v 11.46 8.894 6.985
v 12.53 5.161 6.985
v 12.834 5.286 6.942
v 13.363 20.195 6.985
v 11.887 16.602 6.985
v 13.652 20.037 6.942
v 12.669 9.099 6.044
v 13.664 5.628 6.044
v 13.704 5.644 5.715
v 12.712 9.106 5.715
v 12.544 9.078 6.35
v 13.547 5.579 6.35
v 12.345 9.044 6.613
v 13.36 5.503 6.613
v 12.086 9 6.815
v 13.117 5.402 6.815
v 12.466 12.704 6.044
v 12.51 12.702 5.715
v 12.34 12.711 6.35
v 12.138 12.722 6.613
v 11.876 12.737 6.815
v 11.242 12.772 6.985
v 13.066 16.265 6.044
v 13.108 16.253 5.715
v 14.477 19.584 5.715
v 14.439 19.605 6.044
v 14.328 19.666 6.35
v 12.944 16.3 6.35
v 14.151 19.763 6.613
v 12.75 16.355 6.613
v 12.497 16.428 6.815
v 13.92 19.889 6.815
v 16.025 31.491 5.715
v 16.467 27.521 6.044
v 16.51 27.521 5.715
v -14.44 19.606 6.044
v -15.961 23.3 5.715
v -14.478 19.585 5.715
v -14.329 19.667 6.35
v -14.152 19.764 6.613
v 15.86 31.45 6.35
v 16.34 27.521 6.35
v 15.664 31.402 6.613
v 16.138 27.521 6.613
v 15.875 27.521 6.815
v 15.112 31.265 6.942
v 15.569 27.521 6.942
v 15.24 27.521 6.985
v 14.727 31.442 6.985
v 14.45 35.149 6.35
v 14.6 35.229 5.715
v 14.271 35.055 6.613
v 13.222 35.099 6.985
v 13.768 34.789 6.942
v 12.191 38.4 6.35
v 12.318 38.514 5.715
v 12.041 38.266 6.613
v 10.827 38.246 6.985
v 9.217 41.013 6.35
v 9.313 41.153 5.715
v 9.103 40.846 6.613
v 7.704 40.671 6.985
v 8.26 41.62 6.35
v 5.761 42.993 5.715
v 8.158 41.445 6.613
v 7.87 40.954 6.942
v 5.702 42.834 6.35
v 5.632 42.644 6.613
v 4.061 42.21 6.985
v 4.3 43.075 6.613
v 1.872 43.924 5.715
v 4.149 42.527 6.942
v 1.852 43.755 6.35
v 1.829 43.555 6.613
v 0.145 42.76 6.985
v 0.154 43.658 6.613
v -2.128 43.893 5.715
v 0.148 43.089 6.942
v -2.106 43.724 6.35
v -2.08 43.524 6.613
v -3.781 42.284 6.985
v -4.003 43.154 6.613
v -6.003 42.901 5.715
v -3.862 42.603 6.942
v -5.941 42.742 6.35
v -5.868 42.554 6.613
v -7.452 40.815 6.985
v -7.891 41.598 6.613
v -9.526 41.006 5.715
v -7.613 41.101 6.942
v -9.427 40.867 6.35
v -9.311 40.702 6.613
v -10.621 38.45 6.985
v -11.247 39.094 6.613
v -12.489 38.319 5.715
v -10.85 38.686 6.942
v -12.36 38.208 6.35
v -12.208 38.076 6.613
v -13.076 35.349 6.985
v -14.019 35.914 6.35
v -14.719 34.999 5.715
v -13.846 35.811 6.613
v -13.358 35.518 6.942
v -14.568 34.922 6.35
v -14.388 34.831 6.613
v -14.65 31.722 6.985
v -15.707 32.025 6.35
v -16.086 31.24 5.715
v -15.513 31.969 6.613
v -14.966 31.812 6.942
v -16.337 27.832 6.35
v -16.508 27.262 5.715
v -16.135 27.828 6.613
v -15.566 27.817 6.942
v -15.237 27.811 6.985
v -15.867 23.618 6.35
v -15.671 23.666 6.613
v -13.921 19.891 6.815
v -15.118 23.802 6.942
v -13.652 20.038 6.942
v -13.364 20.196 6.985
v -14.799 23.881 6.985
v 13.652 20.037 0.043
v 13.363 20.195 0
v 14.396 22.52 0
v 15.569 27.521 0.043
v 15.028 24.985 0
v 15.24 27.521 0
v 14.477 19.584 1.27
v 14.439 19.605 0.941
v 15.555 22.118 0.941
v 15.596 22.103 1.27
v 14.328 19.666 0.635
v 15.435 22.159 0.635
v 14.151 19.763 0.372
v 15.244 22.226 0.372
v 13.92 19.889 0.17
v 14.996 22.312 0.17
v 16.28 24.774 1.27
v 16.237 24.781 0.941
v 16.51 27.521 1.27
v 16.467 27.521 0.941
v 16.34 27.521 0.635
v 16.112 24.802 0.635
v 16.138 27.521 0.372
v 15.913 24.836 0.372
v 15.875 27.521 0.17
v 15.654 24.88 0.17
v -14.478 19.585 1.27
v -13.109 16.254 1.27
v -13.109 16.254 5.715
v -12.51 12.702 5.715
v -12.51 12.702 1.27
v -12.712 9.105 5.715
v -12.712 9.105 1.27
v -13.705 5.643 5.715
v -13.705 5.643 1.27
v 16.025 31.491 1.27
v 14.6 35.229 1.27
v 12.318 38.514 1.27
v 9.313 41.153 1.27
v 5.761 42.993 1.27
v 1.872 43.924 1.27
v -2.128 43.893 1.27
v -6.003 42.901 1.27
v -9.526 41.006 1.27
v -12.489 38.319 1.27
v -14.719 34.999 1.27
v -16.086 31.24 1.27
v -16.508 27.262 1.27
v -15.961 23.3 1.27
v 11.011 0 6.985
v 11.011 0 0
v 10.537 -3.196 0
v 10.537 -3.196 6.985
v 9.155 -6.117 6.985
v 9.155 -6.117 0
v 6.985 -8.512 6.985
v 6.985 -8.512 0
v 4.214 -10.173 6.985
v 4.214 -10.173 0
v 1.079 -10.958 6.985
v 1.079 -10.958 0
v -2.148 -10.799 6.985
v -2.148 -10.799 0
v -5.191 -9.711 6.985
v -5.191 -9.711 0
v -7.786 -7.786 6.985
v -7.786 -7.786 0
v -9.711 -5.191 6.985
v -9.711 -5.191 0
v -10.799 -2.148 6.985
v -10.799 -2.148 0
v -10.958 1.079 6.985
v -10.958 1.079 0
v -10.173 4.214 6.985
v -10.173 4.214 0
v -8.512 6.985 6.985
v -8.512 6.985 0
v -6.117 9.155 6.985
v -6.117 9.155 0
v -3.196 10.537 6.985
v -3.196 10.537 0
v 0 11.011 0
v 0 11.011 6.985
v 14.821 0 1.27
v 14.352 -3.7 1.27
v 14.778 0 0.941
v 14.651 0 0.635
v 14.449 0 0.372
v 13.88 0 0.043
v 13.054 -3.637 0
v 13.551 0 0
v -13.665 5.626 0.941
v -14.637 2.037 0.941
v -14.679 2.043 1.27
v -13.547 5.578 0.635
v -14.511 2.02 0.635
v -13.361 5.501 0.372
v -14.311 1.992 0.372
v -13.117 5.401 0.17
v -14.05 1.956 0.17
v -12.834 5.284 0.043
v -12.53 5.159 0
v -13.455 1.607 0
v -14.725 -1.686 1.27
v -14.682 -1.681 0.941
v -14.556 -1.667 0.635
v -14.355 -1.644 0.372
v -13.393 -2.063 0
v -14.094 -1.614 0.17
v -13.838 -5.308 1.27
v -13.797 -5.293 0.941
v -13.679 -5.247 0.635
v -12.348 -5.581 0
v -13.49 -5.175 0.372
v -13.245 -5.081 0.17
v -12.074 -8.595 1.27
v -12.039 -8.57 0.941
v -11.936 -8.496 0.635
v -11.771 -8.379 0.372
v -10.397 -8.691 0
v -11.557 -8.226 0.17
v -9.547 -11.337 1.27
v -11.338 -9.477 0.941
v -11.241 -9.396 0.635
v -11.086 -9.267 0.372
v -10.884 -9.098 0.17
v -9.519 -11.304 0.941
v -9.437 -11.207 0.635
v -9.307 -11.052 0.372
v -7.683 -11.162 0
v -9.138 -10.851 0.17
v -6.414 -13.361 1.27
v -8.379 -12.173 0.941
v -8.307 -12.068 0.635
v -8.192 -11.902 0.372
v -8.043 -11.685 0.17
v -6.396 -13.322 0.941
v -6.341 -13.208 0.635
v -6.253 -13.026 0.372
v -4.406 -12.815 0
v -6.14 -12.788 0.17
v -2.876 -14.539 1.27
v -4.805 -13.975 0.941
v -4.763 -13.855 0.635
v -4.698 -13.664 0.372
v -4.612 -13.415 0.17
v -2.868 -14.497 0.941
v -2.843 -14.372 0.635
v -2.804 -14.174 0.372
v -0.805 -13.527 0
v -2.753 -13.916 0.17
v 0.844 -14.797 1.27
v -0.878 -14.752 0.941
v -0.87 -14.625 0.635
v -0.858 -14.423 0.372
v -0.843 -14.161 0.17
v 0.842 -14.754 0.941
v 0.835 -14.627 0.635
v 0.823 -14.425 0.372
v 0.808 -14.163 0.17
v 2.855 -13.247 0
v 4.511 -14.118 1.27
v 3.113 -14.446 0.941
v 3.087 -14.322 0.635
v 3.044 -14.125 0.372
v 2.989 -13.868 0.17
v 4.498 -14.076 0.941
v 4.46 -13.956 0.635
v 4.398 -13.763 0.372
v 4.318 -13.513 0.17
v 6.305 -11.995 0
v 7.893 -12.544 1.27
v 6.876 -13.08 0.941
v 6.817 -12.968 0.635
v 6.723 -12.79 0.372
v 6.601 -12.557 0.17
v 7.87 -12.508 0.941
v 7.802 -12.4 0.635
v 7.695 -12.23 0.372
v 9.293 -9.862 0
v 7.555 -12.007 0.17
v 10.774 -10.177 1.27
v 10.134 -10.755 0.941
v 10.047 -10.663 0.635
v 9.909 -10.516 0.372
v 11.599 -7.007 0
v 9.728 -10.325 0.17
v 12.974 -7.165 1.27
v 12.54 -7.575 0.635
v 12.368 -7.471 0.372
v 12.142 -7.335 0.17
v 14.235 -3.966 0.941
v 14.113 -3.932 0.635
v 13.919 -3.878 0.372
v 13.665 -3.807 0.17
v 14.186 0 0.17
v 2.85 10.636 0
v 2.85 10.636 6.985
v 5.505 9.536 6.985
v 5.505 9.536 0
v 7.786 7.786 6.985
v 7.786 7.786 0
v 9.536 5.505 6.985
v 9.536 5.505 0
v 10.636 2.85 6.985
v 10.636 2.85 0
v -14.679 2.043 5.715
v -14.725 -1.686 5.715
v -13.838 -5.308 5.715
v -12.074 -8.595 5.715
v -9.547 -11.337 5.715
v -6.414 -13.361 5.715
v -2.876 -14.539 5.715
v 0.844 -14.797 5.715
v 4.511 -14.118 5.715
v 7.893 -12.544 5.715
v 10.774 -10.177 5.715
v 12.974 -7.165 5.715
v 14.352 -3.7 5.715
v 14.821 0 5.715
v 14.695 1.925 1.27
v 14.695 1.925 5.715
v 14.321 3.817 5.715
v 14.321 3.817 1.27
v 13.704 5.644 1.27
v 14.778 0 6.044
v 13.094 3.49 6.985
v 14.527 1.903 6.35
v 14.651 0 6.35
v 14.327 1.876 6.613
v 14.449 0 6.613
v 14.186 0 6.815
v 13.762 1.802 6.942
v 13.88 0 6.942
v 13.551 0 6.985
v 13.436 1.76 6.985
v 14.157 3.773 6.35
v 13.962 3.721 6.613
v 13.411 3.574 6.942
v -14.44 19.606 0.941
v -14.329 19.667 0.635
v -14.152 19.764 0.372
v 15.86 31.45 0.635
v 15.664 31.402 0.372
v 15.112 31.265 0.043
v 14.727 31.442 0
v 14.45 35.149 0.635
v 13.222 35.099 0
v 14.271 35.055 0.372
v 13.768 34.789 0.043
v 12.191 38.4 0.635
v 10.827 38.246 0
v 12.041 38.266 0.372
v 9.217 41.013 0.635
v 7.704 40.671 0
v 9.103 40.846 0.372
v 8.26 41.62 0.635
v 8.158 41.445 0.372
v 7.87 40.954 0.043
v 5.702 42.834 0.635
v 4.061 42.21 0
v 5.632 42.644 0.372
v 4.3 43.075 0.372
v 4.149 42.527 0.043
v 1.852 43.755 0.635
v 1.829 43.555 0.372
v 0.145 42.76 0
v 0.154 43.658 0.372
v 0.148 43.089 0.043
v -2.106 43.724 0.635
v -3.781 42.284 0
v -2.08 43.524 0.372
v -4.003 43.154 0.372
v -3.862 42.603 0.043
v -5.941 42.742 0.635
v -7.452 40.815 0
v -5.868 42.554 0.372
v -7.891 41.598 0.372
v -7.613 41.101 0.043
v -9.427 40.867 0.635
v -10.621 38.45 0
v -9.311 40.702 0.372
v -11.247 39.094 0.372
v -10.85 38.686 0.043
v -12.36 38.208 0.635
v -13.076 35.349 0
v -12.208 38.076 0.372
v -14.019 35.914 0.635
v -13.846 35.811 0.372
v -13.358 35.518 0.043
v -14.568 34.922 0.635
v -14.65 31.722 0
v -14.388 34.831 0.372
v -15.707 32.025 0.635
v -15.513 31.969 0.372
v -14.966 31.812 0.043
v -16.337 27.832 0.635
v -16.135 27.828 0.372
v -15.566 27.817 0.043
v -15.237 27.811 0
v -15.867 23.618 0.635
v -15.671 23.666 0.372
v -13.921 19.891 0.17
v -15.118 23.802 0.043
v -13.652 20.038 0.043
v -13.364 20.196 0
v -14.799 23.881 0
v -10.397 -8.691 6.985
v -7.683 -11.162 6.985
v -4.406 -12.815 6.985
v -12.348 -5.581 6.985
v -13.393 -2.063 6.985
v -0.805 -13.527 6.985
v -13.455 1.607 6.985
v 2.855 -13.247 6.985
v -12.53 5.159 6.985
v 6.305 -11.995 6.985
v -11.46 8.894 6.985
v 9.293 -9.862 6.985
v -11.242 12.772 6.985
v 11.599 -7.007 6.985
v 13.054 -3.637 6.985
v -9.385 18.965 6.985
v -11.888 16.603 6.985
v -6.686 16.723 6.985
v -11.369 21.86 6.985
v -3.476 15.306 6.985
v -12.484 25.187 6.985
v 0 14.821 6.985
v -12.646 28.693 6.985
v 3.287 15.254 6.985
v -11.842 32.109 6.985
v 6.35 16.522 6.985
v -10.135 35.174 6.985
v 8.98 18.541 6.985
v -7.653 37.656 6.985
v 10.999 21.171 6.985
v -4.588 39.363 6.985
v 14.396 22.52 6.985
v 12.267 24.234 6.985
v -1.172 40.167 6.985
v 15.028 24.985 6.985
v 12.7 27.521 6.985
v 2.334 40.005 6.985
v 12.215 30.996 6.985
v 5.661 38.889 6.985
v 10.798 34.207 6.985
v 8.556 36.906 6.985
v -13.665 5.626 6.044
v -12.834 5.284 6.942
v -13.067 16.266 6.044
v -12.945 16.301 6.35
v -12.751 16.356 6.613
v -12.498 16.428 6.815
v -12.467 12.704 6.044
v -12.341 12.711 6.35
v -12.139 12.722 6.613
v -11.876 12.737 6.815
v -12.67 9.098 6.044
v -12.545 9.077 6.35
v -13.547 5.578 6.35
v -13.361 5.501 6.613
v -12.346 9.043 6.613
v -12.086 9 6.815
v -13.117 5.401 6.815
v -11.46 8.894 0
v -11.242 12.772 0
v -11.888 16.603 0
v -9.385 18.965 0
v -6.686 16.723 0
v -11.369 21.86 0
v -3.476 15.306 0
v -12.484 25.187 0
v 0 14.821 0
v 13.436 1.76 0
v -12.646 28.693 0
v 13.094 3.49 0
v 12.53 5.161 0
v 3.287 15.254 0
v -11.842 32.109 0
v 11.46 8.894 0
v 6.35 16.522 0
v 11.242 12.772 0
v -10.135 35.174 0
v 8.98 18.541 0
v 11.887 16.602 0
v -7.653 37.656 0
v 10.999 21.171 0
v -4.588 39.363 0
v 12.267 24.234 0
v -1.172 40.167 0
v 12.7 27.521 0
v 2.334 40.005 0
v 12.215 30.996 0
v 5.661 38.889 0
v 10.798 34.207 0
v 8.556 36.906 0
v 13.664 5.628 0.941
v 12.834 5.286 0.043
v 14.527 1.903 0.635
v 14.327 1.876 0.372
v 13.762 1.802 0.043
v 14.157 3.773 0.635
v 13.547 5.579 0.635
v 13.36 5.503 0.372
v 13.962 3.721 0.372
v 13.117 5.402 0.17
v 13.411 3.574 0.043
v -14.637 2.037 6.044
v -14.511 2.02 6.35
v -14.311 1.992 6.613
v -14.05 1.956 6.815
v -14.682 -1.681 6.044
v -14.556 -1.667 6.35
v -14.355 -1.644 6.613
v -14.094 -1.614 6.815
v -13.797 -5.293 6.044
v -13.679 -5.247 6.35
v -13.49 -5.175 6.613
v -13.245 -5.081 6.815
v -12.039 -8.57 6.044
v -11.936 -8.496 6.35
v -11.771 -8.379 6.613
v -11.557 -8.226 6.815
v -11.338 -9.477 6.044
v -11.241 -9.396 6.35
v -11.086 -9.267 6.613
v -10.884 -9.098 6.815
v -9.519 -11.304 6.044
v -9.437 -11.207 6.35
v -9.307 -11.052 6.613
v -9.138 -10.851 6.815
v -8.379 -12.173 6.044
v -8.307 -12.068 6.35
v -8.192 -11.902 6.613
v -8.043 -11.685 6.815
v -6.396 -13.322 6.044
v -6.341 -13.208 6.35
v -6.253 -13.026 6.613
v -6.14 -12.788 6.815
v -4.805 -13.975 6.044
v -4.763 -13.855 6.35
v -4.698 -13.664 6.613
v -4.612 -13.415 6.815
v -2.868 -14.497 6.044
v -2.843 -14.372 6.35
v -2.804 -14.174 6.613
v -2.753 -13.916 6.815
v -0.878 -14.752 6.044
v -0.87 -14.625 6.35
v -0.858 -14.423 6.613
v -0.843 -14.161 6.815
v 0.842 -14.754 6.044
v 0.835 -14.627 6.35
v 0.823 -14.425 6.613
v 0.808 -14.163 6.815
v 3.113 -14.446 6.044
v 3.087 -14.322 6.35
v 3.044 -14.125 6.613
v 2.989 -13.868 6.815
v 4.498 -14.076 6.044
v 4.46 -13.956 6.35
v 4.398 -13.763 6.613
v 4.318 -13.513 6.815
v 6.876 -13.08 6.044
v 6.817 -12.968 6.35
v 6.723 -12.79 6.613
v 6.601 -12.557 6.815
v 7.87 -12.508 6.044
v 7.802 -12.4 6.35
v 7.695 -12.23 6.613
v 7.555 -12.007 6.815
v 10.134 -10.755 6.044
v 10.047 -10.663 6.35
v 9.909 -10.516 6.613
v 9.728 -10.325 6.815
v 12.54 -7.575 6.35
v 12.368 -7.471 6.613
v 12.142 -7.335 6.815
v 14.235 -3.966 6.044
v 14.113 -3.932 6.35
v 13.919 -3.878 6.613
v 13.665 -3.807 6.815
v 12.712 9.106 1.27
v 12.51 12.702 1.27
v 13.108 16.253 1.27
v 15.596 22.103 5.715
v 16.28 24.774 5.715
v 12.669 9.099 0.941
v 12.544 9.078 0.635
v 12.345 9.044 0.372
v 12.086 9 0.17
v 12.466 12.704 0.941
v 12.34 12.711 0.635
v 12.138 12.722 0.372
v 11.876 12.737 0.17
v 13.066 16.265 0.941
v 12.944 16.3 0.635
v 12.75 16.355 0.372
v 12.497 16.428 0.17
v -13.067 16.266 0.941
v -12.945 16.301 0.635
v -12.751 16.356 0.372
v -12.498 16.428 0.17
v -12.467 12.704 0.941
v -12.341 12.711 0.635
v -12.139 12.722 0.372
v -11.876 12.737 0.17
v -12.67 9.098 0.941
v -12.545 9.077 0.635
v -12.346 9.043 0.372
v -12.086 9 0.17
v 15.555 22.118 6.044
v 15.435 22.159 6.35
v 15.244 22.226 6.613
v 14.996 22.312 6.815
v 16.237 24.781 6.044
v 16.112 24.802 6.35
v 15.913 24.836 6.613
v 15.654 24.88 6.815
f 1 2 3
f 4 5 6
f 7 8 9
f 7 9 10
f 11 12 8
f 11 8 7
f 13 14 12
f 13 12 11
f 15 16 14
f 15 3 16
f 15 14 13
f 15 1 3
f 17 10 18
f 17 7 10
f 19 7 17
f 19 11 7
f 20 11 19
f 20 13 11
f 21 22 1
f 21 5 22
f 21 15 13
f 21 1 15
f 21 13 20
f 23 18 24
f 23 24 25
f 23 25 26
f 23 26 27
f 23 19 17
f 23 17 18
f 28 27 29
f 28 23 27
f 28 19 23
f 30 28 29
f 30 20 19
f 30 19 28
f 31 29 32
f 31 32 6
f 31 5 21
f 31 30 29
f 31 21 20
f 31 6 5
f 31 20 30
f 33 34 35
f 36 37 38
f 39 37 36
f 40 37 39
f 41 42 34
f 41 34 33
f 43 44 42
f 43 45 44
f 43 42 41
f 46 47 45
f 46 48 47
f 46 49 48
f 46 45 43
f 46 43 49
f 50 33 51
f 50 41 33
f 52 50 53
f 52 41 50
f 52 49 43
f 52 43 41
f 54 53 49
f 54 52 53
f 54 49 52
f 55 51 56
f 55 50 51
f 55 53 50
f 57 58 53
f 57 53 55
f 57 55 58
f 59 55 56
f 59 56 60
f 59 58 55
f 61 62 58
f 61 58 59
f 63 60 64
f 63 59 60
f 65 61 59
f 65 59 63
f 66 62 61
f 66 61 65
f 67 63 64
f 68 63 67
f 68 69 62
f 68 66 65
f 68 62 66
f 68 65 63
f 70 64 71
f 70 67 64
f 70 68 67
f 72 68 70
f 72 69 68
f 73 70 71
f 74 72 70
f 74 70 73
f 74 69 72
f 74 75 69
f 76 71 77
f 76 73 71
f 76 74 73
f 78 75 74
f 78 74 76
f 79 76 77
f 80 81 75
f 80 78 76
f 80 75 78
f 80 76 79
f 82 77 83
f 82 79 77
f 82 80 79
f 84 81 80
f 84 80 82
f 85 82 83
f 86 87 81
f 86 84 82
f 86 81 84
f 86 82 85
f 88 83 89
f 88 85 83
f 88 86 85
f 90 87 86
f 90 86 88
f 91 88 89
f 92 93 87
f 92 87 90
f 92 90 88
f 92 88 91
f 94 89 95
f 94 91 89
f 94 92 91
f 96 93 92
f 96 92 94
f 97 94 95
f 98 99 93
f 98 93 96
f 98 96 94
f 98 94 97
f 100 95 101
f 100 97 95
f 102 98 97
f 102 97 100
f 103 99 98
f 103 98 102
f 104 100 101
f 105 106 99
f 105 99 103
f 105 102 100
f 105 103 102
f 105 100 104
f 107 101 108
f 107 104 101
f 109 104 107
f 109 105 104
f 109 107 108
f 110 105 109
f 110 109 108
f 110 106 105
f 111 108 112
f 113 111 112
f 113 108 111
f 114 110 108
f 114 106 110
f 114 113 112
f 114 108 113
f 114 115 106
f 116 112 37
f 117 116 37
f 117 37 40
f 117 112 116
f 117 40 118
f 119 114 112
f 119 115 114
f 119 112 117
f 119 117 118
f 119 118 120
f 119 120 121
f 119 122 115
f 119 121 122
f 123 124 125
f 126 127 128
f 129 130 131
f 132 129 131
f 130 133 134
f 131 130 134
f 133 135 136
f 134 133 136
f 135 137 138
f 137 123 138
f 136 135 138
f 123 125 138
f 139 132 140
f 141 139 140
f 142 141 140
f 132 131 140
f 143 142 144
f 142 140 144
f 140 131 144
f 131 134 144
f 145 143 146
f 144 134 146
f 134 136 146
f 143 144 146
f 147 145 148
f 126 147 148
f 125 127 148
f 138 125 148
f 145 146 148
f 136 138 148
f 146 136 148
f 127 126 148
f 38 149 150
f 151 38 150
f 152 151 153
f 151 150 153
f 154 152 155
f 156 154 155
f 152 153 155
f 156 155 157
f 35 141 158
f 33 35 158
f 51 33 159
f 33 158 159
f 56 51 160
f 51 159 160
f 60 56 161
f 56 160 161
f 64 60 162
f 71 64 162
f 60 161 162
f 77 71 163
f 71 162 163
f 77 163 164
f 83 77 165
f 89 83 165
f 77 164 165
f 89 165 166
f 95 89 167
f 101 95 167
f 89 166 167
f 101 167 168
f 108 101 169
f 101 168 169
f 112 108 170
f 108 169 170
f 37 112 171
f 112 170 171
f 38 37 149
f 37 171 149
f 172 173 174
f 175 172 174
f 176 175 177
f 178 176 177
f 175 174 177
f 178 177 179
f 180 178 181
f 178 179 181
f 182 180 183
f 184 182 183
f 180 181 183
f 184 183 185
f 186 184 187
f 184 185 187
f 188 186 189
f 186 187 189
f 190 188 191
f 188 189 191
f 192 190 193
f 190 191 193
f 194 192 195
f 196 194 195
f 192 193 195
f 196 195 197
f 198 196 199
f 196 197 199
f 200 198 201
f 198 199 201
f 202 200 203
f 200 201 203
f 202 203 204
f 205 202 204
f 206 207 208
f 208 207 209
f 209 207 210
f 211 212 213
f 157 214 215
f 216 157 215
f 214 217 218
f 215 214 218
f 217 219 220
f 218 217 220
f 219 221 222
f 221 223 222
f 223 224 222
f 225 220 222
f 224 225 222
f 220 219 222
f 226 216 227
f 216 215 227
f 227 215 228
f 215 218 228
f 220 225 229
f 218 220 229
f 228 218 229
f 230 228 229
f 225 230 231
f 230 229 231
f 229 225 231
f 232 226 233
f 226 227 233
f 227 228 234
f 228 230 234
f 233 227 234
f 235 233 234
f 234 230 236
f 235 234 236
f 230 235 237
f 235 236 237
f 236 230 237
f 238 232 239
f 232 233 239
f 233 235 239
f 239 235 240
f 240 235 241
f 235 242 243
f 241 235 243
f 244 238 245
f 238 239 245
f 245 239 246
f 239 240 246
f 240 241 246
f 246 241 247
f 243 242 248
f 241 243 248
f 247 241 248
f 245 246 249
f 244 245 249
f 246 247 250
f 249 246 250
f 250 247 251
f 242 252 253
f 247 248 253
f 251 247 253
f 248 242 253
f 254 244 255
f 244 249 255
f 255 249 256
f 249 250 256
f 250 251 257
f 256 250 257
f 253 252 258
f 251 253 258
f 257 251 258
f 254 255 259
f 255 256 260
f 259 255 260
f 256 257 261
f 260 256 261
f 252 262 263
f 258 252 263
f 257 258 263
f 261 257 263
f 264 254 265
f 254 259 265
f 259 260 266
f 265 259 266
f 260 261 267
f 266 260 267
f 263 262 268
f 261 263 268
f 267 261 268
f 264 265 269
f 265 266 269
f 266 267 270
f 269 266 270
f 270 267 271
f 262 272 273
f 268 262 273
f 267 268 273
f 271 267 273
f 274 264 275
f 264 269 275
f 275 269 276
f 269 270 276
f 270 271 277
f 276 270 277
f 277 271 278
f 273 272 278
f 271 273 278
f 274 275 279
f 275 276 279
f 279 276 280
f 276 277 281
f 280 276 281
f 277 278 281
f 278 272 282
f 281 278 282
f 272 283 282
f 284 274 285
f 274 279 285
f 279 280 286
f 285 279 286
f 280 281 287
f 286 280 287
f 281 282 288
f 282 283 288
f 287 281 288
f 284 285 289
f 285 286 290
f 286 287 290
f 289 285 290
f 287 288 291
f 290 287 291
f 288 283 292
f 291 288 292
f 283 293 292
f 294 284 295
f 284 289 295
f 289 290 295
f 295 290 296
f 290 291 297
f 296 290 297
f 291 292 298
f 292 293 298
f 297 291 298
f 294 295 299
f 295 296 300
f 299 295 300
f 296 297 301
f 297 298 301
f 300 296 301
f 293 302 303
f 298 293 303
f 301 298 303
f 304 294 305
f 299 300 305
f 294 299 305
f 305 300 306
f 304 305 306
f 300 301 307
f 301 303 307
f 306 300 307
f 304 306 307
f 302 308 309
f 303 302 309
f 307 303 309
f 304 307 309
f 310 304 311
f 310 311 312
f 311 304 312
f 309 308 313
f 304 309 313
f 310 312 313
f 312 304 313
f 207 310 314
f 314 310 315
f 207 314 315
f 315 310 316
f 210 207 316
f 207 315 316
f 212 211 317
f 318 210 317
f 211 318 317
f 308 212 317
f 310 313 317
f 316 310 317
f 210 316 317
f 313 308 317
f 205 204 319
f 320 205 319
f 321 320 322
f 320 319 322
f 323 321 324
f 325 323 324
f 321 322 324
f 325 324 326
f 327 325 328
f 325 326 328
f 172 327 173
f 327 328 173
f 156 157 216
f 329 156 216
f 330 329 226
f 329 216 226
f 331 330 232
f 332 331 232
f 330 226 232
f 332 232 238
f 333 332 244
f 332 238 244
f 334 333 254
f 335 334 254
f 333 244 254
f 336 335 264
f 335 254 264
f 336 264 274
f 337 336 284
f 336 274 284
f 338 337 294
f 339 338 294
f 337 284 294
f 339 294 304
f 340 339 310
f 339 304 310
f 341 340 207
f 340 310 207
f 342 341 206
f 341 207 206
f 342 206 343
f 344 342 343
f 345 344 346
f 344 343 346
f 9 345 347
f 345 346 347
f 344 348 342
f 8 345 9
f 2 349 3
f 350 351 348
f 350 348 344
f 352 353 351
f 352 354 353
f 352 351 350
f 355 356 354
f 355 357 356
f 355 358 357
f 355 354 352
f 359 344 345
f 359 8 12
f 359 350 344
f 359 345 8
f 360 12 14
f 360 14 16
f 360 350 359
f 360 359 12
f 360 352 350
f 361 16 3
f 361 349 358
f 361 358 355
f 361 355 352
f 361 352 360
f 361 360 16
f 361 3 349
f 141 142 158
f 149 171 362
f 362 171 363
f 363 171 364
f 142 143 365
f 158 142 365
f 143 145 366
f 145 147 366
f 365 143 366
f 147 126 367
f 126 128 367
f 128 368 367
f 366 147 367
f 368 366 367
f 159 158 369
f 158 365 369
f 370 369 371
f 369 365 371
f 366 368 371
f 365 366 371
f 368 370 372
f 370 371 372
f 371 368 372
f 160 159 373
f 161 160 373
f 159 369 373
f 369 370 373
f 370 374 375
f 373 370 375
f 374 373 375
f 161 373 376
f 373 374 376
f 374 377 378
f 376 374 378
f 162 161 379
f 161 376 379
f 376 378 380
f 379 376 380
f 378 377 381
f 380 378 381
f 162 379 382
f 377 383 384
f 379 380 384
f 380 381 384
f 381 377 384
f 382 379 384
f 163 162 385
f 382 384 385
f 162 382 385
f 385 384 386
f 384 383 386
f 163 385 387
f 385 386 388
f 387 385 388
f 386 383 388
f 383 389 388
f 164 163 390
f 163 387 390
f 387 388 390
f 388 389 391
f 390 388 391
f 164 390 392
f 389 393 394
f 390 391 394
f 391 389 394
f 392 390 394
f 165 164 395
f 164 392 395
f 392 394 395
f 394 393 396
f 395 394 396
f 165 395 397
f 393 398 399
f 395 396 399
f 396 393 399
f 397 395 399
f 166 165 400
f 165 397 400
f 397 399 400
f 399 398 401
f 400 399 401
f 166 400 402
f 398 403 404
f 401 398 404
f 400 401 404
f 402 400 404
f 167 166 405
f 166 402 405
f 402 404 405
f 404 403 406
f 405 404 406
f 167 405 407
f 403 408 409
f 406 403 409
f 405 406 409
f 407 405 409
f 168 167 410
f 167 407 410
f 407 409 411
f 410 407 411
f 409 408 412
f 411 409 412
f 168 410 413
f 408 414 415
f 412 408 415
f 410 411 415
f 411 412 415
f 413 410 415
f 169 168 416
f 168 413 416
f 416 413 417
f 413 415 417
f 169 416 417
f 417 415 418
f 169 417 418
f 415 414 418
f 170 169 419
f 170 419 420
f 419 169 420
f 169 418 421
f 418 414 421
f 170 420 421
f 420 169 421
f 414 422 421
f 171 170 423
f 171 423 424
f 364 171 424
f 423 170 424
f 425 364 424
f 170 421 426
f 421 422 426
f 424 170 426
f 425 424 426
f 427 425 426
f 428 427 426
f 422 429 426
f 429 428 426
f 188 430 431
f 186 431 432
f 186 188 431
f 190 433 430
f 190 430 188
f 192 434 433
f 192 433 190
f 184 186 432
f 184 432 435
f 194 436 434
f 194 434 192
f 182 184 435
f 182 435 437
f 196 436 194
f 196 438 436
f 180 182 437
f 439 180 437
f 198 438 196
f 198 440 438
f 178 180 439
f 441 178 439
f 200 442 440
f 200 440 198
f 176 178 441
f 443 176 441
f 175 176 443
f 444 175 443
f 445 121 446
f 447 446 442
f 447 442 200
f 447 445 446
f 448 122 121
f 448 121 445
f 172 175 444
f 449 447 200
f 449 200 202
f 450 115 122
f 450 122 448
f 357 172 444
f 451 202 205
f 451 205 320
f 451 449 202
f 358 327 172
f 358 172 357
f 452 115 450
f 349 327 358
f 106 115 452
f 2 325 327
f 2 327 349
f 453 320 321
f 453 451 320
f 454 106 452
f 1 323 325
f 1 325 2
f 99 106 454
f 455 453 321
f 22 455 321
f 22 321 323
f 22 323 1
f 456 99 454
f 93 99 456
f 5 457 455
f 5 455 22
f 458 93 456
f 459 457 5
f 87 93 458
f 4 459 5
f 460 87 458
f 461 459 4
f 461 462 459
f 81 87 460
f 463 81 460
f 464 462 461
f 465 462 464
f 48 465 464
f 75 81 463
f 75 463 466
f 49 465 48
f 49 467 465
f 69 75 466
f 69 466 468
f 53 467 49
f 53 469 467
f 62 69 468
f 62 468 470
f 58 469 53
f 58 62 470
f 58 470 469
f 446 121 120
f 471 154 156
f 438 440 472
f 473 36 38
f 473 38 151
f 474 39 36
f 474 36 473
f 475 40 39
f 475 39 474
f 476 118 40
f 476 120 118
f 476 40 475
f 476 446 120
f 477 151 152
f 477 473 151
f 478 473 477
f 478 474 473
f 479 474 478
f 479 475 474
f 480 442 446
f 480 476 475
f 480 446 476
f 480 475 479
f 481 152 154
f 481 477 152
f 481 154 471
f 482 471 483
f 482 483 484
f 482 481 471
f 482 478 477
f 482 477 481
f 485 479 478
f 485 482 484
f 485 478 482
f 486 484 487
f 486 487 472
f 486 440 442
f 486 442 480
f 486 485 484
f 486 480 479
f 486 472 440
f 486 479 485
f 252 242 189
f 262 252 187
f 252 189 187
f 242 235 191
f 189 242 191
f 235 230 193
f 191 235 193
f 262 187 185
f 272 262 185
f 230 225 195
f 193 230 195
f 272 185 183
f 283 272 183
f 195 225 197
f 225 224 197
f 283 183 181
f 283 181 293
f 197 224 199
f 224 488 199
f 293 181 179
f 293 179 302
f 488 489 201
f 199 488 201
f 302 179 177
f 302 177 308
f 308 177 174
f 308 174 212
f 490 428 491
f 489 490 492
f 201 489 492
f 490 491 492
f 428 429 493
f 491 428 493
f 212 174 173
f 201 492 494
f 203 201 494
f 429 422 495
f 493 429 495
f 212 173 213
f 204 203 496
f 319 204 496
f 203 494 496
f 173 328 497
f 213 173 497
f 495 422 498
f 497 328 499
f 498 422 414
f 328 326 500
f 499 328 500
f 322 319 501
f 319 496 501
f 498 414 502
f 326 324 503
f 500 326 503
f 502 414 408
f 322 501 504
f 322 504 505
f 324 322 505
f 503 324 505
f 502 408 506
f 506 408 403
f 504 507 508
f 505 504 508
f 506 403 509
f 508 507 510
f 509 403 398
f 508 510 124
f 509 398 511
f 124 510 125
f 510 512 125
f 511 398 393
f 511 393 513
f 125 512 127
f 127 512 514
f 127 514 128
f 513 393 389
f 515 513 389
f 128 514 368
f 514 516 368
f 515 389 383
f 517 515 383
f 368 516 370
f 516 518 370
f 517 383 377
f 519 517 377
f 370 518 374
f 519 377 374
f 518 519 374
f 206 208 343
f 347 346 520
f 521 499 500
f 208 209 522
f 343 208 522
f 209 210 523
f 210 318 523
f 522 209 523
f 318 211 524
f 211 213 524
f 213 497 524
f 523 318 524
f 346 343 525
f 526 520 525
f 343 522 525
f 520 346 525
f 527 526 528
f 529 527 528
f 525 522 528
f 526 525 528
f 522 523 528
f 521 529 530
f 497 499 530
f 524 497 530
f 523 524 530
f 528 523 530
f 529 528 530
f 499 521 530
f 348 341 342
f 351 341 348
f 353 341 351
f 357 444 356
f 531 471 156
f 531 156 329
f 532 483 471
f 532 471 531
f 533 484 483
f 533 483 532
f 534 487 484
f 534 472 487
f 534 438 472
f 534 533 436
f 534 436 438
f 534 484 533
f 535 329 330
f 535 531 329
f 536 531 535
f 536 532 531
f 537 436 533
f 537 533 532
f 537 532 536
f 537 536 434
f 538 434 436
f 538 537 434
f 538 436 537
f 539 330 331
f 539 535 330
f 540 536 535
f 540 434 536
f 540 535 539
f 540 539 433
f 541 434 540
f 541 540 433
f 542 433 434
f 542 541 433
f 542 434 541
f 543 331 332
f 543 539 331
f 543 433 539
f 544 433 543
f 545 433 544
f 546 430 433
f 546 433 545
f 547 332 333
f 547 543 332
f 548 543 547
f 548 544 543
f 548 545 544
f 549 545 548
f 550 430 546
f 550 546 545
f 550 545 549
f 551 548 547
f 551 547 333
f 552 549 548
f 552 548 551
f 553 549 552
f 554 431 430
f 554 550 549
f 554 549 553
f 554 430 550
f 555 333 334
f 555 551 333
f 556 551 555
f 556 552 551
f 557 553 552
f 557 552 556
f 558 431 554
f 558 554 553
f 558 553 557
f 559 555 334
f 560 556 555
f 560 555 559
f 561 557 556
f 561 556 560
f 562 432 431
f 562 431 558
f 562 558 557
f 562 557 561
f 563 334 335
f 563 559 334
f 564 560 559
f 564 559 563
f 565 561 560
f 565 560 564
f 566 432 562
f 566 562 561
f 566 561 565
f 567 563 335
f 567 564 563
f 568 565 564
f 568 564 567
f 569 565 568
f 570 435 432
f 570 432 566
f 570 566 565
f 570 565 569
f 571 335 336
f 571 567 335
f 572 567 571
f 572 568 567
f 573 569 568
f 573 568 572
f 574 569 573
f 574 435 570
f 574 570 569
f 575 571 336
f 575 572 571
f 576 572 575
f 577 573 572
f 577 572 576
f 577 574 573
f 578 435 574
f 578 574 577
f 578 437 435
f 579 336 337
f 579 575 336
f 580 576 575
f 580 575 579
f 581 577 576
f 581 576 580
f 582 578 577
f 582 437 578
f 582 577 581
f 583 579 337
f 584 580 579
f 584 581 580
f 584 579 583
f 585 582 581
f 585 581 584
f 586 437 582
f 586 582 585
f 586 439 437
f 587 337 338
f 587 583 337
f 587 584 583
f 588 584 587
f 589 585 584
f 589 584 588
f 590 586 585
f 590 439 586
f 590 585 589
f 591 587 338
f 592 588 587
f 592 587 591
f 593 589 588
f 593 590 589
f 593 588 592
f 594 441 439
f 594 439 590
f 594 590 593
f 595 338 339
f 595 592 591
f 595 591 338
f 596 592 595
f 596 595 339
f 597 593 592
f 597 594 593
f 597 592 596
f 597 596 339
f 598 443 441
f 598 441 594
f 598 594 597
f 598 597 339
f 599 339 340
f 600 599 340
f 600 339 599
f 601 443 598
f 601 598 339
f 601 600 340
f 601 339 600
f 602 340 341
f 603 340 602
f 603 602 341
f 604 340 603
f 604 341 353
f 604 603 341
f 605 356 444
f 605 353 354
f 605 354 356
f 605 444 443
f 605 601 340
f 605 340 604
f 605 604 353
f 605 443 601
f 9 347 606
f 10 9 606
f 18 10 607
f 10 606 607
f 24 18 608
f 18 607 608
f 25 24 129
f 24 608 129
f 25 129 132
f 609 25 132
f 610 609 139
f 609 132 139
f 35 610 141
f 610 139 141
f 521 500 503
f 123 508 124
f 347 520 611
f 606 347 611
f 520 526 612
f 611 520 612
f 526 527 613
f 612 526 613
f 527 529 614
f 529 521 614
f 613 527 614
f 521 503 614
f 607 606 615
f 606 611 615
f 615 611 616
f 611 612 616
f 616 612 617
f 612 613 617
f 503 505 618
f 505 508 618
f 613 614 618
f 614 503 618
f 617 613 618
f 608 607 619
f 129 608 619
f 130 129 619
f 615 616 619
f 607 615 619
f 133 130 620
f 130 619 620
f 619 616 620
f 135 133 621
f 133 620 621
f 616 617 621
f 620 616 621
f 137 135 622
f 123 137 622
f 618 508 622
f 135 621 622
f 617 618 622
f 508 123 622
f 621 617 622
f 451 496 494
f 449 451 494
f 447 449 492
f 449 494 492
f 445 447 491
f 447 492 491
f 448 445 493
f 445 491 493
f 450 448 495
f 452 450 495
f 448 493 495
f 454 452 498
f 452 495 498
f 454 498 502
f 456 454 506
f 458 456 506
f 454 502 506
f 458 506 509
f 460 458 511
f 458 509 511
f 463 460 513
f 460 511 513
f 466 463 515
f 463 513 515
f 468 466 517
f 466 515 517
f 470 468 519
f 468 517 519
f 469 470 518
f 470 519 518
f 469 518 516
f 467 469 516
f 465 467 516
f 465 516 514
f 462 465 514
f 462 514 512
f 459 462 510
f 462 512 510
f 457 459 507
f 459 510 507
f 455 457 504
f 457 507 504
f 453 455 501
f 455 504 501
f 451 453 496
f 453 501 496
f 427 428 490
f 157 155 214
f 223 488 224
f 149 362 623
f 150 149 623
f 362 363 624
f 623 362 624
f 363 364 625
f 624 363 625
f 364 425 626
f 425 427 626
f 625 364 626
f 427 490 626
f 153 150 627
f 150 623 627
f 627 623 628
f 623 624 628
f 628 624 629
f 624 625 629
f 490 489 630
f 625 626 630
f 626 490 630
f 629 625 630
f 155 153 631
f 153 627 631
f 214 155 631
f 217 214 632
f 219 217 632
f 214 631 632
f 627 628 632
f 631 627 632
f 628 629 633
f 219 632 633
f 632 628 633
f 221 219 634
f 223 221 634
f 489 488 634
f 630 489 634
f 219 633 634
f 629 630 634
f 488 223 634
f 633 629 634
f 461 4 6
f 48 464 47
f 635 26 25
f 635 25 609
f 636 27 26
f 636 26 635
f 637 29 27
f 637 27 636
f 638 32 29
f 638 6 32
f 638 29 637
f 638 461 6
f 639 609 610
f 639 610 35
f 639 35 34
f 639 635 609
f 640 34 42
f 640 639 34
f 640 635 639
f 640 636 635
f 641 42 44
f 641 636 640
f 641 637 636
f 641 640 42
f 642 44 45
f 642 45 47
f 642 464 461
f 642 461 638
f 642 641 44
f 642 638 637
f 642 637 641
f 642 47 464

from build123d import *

# Parameters (mm, degrees)
F1_DEPTH = 6.985
F2_R     = 1.27


with BuildPart() as f1:
    # F0 (on Top) → F1 (new body)
    with BuildSketch(Plane.XY):
        with BuildLine():
            ThreePointArc((-13.7046532603, 5.6428322521), (-11.1770065001, 9.7331188478), (-7.4729632817, 12.7989802953))
            ThreePointArc((-7.4729632817, 12.7989802953), (-11.487981867, 15.6631441995), (-14.4778651692, 19.5854403319))
            ThreePointArc((-14.4778651692, 19.5854403319), (-12.5103993427, 12.7018056629), (-13.7046532603, 5.6428322521))
        make_face()
        with BuildLine():
            ThreePointArc((14.4771044871, 19.5840526618), (11.4874135696, 15.6625936504), (7.4729632817, 12.7989802953))
            ThreePointArc((7.4729632817, 12.7989802953), (11.1765146122, 9.7336836774), (13.7040828571, 5.644217382))
            ThreePointArc((13.7040828571, 5.644217382), (12.5096874073, 12.7018028253), (14.4771044871, 19.5840526618))
        make_face()
        with BuildLine():
            ThreePointArc((7.4729632817, 12.7989802953), (3.8419529979, 11.4641413868), (0, 11.0109))
            ThreePointArc((0, 11.0109), (-3.8419529979, 11.4641413868), (-7.4729632817, 12.7989802953))
            ThreePointArc((-7.4729632817, 12.7989802953), (-11.1770065001, 9.7331188478), (-13.7046532603, 5.6428322521))
            ThreePointArc((-13.7046532603, 5.6428322521), (-2.8760894722, -14.5391604351), (14.8209, 0))
            ThreePointArc((14.8209, 0), (14.5390150703, 2.8768242207), (13.7040828571, 5.644217382))
            ThreePointArc((13.7040828571, 5.644217382), (11.1765146122, 9.7336836774), (7.4729632817, 12.7989802953))
        make_face()
        with BuildLine():
            ThreePointArc((0, 11.0109), (7.785882057, 7.785882057), (11.0109, 0))
            ThreePointArc((11.0109, 0), (-7.785882057, -7.785882057), (0, 11.0109))
        make_face(mode=Mode.SUBTRACT)
        with BuildLine():
            ThreePointArc((-7.4729632817, 12.7989802953), (-3.8708312936, 14.3064929982), (-7.5e-09, 14.8209))
            ThreePointArc((-7.5e-09, 14.8209), (3.8708312864, 14.3064930001), (7.4729632817, 12.7989802953))
            ThreePointArc((7.4729632817, 12.7989802953), (11.4874135696, 15.6625936504), (14.4771044871, 19.5840526618))
            ThreePointArc((14.4771044871, 19.5840526618), (15.9937033717, 23.4243706813), (16.51, 27.5209))
            ThreePointArc((16.51, 27.5209), (-4.095762814, 43.5147996799), (-14.4778651692, 19.5854403319))
            ThreePointArc((-14.4778651692, 19.5854403319), (-11.487981867, 15.6631441995), (-7.4729632817, 12.7989802953))
        make_face()
        with BuildLine():
            ThreePointArc((12.7, 27.5209), (8.9802561184, 18.5406438763), (-7.5e-09, 14.8209))
            ThreePointArc((-7.5e-09, 14.8209), (-8.9802561184, 36.5011561237), (12.7, 27.5209))
        make_face(mode=Mode.SUBTRACT)
        with BuildLine():
            Line((0, 14.8209), (0, 11.0109))
            ThreePointArc((0, 11.0109), (3.8419529979, 11.4641413868), (7.4729632817, 12.7989802953))
            ThreePointArc((7.4729632817, 12.7989802953), (3.8708312864, 14.3064930001), (-7.5e-09, 14.8209))
        make_face()
        with BuildLine():
            ThreePointArc((-7.4729632817, 12.7989802953), (-3.8419529979, 11.4641413868), (0, 11.0109))
            Line((0, 11.0109), (0, 14.8209))
            ThreePointArc((-7.5e-09, 14.8209), (-3.8708312936, 14.3064929982), (-7.4729632817, 12.7989802953))
        make_face()
    extrude(amount=F1_DEPTH)

    # F2
    f2_edges = [f1.edges().sort_by_distance(p)[0] for p in [
        (0.000791, 44.0309, 6.985),
        (0.000791, 44.0309, 0),
    ]]
    fillet(f2_edges, radius=F2_R)


solid = f1.part
